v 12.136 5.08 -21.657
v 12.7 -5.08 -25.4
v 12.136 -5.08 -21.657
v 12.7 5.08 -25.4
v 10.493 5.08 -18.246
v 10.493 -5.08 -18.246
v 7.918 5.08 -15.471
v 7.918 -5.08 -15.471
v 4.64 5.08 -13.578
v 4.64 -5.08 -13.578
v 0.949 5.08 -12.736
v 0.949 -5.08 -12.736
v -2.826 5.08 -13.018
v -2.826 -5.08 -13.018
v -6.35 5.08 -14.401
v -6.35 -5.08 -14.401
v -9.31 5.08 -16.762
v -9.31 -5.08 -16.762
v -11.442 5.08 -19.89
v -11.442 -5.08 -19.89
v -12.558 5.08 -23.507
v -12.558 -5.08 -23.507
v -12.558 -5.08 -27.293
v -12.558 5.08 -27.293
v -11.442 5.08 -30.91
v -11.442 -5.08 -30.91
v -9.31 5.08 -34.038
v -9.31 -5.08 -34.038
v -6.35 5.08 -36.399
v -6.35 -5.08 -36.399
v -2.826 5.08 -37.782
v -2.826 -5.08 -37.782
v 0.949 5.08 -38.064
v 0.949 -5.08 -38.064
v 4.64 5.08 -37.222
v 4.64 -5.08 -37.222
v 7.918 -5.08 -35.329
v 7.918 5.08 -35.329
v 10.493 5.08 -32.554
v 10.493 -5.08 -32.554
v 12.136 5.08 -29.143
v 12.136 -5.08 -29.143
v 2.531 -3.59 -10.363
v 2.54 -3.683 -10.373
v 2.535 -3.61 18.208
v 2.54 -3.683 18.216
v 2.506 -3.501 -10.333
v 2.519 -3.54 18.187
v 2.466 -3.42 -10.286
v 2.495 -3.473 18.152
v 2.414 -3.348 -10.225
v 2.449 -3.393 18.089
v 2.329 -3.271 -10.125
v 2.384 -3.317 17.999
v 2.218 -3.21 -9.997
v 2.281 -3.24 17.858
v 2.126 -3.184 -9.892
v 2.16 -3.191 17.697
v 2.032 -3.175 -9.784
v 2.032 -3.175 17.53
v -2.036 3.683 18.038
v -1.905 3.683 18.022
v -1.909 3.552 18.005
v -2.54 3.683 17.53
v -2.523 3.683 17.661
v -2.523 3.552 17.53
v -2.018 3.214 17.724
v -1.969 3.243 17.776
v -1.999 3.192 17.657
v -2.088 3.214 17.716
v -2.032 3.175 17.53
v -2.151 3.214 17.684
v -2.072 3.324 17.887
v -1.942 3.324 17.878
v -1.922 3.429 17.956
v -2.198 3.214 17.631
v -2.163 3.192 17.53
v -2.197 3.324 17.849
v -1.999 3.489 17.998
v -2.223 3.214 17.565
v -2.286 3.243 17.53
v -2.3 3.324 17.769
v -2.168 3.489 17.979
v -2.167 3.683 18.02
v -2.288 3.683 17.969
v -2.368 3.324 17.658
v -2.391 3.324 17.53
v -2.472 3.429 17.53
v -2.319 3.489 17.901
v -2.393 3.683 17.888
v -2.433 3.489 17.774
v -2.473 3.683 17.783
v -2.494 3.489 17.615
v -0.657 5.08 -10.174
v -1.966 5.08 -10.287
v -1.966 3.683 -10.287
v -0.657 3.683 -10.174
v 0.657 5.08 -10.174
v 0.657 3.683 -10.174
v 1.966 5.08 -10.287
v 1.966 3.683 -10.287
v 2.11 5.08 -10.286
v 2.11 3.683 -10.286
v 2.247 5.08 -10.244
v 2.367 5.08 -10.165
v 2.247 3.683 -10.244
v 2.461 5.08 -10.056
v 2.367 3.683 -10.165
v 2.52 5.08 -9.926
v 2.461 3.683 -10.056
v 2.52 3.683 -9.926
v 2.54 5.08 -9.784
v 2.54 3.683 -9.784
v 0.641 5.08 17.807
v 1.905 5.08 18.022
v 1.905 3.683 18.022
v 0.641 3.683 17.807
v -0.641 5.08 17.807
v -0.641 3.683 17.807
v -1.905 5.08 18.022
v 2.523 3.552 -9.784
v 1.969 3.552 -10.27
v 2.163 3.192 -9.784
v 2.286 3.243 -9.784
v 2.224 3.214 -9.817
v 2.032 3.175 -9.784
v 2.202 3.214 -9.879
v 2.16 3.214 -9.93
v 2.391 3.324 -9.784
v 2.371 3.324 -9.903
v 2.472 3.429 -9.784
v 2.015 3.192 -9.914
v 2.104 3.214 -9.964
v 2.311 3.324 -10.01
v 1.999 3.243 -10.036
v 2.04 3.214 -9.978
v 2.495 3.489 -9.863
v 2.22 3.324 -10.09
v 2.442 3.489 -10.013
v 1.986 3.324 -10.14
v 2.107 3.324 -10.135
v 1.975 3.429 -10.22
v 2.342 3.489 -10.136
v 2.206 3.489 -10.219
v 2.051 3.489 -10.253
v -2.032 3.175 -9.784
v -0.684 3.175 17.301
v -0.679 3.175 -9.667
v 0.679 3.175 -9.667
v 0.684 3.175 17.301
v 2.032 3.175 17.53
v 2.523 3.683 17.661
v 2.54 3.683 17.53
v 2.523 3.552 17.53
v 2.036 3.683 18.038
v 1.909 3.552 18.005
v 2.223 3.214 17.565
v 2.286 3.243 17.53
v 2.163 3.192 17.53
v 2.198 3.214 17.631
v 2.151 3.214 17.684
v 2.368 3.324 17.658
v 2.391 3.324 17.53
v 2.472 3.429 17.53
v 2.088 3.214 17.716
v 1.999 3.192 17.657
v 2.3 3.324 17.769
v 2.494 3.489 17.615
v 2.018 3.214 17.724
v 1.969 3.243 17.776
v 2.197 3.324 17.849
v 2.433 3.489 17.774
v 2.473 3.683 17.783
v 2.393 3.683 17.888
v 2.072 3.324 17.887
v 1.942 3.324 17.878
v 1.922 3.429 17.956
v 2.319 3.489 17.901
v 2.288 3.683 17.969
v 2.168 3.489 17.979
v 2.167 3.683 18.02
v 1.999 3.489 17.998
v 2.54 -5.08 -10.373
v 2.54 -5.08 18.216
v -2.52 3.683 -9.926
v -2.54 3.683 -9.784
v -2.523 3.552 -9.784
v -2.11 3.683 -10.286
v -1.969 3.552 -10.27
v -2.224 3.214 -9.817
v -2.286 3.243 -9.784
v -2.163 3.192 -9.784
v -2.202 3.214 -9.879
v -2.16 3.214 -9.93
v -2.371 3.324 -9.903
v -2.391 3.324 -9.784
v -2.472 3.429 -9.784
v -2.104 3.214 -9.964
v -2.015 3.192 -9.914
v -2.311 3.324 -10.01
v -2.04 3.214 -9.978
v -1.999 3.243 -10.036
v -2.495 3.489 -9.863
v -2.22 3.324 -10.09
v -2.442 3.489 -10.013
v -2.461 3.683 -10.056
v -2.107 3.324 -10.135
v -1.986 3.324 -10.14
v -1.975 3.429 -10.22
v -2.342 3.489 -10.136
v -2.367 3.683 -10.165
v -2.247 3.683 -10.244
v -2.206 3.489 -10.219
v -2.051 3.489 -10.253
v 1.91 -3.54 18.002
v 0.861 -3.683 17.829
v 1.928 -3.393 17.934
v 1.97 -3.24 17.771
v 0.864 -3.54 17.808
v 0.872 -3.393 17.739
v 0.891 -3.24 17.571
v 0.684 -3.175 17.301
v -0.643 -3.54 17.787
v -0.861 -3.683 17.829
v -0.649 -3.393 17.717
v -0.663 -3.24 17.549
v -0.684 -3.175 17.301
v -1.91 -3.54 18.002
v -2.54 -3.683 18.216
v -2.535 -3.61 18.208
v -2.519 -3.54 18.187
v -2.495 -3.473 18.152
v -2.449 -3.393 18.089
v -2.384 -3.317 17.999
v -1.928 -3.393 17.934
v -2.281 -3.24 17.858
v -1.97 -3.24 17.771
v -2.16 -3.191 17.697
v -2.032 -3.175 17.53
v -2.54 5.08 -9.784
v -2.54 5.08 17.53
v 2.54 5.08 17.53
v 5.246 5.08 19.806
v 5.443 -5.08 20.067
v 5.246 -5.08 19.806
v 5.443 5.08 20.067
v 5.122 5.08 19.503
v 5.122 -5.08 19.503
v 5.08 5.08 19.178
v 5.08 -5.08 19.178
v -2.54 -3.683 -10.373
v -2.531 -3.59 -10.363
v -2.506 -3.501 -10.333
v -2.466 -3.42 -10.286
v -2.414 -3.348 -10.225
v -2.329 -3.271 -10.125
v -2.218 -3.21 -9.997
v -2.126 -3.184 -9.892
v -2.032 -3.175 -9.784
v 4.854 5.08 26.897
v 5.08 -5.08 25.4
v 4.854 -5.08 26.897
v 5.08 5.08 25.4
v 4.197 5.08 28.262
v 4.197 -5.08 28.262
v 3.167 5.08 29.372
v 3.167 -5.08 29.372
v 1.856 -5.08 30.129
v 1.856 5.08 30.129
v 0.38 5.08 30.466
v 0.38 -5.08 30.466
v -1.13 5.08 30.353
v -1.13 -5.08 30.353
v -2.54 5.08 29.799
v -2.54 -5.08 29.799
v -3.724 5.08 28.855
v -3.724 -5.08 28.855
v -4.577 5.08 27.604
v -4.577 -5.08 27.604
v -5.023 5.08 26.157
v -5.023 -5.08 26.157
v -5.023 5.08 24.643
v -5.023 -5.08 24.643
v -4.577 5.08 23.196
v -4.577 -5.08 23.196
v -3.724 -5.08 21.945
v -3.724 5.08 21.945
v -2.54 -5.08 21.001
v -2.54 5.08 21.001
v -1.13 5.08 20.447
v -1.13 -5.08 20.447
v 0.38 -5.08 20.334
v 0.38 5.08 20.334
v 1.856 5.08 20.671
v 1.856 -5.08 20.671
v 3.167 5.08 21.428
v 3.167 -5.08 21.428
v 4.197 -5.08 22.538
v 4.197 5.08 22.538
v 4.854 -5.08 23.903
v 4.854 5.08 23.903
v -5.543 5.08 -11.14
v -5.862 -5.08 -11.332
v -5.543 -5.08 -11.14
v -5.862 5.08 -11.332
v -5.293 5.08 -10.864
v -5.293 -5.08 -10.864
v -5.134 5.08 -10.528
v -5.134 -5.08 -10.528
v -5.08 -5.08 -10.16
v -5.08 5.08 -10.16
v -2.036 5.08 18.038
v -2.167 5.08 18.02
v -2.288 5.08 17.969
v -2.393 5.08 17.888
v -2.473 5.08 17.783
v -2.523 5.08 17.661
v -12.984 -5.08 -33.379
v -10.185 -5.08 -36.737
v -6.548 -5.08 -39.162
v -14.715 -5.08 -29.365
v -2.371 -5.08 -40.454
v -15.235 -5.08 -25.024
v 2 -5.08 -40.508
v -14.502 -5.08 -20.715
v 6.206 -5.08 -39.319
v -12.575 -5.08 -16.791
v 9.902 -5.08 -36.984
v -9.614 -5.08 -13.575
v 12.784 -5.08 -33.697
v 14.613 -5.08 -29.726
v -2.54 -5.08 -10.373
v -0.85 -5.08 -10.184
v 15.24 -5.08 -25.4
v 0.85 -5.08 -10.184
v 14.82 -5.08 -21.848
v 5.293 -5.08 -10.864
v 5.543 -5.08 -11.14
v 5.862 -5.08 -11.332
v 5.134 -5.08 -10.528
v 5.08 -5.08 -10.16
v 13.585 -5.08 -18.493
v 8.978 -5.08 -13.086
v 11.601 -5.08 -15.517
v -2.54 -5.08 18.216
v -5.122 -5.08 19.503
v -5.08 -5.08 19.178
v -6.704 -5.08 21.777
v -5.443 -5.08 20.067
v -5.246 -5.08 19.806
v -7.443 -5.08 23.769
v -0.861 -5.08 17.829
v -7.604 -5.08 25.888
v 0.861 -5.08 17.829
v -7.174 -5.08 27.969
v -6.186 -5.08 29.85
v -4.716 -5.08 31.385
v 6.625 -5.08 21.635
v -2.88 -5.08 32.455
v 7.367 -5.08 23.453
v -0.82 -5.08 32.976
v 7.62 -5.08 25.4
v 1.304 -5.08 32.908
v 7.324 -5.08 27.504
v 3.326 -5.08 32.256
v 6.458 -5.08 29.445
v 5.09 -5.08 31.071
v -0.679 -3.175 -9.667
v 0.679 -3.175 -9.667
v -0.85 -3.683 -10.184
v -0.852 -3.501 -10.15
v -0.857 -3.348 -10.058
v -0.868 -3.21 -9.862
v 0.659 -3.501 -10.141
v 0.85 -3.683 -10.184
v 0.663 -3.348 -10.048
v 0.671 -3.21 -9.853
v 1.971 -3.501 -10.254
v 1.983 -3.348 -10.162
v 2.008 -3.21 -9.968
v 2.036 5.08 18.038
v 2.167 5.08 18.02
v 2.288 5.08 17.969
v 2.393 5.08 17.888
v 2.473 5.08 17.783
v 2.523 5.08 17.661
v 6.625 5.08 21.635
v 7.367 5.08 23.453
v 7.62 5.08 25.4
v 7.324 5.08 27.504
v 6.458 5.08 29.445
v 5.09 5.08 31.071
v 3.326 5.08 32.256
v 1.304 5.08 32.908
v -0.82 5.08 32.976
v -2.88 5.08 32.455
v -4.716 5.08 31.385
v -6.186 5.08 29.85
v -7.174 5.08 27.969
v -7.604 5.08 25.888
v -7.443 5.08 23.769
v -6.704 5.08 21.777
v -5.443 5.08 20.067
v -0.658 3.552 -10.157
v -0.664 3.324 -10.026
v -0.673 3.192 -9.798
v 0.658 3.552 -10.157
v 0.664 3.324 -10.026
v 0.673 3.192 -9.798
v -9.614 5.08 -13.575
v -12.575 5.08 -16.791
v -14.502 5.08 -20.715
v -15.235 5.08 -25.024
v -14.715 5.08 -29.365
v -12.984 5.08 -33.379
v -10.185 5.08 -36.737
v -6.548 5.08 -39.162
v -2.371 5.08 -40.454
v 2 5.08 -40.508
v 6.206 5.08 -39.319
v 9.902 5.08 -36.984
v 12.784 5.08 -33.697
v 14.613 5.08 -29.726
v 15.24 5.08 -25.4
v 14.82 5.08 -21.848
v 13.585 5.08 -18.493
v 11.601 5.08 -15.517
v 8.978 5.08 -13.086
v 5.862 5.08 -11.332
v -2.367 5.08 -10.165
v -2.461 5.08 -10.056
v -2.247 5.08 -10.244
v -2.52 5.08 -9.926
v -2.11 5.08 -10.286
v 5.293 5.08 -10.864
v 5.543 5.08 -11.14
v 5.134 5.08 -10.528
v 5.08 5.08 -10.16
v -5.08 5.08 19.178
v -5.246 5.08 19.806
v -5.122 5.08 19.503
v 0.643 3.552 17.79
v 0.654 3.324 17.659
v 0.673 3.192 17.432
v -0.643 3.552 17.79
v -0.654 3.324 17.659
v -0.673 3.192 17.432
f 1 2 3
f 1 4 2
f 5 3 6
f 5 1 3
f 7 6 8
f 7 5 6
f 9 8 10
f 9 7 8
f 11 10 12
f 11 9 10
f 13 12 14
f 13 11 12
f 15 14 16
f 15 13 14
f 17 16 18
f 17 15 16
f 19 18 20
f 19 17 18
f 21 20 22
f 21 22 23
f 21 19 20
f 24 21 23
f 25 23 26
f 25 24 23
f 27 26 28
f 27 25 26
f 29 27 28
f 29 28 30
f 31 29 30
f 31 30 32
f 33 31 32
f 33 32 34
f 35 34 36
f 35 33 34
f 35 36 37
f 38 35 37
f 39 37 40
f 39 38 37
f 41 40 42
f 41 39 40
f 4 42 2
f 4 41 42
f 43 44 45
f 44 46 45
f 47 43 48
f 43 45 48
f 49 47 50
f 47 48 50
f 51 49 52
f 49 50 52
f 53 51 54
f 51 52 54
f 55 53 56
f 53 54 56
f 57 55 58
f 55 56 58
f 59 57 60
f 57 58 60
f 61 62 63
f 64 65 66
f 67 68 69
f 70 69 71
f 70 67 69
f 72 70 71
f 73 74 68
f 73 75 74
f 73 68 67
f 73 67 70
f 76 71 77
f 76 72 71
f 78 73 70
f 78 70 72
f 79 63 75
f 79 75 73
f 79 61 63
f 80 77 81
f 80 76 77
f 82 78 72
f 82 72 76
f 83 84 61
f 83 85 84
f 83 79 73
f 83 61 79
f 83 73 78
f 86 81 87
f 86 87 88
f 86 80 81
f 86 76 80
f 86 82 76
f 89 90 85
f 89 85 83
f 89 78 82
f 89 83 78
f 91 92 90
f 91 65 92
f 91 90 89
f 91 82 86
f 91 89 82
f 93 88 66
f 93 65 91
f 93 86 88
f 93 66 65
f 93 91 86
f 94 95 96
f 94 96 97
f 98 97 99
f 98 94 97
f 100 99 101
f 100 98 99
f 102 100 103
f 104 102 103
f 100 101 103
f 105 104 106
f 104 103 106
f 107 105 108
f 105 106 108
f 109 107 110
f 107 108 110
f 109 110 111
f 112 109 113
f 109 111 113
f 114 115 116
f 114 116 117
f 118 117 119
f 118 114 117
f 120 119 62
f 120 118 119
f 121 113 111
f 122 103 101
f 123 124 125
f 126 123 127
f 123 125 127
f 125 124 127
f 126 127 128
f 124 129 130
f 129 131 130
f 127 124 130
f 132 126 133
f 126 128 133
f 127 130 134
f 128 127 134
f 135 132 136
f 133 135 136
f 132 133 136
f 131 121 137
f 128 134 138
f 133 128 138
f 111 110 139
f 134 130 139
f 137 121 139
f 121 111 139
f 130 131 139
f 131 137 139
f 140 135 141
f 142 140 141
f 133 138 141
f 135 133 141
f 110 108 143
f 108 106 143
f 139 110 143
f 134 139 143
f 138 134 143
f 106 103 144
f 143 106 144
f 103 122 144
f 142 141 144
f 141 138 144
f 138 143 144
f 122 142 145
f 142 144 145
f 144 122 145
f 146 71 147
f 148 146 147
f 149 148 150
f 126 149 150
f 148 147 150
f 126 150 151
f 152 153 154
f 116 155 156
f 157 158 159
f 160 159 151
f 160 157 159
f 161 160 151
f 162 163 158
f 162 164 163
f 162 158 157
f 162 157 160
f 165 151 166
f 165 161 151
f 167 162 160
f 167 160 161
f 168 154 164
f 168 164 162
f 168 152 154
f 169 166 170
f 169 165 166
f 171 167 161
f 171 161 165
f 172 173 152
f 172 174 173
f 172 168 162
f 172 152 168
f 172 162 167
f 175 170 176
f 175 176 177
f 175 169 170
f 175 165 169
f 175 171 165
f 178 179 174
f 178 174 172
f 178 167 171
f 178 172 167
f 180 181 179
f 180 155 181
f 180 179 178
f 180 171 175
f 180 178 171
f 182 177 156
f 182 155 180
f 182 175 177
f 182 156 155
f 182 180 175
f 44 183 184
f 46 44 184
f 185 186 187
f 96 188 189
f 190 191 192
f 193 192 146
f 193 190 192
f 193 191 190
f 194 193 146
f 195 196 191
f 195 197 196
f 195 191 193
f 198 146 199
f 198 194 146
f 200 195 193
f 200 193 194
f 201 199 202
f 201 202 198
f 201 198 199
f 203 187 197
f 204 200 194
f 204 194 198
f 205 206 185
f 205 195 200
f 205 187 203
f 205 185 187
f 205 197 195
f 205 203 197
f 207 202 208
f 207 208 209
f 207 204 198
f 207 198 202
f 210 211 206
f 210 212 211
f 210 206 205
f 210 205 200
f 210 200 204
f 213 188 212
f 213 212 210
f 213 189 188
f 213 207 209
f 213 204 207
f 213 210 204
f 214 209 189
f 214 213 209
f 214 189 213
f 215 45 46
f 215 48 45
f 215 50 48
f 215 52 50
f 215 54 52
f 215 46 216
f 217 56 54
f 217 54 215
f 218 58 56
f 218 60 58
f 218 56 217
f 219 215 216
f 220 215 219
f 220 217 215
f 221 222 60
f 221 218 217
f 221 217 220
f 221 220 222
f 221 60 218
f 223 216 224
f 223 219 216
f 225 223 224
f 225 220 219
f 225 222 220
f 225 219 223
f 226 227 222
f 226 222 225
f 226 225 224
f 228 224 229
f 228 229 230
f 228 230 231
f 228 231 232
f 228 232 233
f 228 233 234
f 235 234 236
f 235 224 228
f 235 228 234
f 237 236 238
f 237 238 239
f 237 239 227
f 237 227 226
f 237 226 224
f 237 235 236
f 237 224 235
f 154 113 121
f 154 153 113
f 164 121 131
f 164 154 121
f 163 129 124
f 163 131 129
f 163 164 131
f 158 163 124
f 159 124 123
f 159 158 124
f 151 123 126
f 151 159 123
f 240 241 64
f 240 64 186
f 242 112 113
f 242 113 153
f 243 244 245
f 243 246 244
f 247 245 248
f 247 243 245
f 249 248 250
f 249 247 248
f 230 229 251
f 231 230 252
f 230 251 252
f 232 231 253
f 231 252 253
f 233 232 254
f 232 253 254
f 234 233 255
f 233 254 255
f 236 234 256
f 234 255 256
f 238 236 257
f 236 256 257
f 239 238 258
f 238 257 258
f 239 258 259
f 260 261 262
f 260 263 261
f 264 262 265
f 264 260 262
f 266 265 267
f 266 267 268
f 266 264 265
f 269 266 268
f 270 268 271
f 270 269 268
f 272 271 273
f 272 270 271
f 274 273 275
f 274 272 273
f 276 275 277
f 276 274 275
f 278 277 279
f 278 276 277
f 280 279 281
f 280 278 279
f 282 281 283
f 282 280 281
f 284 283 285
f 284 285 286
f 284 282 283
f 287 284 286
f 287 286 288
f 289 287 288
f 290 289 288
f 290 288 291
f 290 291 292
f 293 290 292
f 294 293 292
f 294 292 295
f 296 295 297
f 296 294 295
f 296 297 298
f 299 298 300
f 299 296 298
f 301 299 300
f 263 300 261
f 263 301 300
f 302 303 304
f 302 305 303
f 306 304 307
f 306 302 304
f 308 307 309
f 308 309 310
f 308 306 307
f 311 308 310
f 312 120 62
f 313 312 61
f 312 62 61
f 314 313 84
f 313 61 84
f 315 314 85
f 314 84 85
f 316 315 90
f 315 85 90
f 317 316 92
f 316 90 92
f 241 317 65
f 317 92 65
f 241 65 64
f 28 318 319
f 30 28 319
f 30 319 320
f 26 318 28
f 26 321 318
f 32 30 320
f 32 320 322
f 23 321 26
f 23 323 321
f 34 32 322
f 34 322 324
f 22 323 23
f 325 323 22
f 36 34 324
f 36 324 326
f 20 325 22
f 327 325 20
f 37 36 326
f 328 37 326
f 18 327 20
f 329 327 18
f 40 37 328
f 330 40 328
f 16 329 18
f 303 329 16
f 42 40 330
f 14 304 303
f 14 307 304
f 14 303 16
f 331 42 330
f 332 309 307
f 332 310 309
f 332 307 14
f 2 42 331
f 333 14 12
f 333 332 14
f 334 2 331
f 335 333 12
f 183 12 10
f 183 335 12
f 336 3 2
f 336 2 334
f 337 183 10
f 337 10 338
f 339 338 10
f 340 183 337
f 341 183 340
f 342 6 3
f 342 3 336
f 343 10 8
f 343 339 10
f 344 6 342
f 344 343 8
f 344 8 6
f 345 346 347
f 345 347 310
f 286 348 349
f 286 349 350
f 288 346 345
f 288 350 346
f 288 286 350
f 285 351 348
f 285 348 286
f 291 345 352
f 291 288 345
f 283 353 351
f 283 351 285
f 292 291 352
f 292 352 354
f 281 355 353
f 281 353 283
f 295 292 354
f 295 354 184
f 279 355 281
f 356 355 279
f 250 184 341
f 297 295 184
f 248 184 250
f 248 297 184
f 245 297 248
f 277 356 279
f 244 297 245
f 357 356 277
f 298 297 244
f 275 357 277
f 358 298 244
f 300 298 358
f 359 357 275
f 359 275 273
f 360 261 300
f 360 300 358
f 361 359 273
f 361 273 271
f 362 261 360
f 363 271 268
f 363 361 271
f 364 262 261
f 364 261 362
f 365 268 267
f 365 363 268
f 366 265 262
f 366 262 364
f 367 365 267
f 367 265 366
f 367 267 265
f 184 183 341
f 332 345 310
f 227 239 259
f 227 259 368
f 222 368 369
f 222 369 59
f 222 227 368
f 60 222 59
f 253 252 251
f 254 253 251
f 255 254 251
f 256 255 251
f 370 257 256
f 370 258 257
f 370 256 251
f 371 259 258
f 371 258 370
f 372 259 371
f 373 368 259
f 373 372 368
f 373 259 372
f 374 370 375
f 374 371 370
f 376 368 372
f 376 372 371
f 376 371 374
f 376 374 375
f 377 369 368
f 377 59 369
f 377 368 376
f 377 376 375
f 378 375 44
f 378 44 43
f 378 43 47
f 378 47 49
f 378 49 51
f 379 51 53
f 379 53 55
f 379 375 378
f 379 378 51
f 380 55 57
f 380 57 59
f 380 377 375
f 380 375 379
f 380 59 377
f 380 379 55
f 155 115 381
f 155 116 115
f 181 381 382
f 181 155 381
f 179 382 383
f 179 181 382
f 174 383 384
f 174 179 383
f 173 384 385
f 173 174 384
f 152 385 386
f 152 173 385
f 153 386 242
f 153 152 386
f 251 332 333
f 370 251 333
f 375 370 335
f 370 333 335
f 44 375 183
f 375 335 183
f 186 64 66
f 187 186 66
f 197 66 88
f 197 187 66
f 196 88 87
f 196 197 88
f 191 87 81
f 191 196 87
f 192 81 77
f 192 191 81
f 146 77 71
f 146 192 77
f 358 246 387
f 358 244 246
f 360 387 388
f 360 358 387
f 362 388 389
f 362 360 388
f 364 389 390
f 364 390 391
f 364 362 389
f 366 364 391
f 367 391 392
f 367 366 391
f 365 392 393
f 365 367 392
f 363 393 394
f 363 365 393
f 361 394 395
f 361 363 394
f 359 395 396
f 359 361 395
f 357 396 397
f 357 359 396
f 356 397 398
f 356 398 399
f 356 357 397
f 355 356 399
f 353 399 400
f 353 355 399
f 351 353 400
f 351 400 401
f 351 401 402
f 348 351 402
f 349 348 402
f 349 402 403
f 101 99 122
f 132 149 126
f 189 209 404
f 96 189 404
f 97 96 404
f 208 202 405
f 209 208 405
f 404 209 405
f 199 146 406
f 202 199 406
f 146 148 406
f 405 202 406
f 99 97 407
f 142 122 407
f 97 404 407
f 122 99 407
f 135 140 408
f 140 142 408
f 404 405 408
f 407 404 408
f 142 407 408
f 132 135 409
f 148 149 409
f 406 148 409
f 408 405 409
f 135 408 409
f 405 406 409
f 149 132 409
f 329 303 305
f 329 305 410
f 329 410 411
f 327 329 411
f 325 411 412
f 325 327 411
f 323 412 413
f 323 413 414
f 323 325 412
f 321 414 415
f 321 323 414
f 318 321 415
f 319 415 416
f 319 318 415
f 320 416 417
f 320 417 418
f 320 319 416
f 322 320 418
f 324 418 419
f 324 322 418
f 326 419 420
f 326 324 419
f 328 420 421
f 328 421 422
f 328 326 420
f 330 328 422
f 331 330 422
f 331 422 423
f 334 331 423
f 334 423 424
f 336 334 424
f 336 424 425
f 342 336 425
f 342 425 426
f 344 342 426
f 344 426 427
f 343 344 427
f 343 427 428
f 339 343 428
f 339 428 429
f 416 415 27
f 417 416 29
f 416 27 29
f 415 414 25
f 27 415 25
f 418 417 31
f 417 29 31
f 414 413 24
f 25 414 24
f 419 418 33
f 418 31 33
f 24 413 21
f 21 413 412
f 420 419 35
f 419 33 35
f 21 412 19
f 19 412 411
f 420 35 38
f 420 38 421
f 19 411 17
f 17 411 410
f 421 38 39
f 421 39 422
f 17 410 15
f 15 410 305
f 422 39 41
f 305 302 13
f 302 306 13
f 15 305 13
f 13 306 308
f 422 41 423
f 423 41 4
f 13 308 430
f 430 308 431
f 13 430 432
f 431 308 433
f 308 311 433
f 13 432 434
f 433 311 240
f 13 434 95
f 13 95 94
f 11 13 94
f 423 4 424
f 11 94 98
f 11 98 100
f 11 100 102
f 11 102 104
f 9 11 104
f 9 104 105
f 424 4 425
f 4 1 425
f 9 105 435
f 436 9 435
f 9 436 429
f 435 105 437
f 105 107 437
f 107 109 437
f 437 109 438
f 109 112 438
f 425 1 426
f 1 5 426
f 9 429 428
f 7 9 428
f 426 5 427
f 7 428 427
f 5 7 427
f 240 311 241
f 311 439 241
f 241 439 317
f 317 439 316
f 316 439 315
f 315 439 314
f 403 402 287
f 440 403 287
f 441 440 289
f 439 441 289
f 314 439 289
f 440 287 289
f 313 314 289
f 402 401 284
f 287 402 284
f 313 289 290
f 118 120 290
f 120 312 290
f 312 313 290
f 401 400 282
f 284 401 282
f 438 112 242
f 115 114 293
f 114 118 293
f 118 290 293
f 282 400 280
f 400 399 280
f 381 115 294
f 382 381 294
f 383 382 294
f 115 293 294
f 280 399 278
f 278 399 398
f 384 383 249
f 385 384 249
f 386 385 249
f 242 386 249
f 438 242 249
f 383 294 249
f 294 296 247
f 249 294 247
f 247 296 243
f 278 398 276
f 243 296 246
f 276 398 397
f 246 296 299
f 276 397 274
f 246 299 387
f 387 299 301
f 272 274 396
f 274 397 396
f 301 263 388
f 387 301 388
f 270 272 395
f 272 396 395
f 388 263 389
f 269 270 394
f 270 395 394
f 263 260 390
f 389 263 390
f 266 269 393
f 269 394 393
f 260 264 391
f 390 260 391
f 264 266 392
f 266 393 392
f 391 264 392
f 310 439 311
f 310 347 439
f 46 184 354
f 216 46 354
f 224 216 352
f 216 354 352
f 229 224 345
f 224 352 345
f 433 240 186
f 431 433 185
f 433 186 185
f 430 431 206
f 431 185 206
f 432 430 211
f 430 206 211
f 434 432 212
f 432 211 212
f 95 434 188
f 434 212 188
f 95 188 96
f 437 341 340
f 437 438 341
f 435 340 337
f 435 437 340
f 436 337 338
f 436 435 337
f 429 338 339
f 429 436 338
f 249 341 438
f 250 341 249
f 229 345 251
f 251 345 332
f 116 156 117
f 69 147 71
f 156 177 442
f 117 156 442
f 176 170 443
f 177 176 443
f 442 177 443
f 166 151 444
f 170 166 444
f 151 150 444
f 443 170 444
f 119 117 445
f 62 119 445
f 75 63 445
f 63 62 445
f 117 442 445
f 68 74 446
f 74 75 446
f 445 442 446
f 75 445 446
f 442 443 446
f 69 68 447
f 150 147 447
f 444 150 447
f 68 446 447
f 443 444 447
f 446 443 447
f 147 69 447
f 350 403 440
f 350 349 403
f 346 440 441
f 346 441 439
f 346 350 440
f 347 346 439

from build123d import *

# Parameters (mm, degrees)
F0_R     = 5.08
F0_R_2   = 12.7
F1_DEPTH = 5.08
F2_R     = 1.27
F4_DEPTH = 1.905
F5_R     = 0.508


# Not quite as in the source:
# - a pattern or mirror of a feature is missing from the dataset's text; its kind, count and spacing are read off the source's solid


with BuildPart() as f1:
    # F0 (on Front) → F1 (new body, symmetric)
    with BuildSketch(Plane.XZ):
        with BuildLine():
            ThreePointArc((5.08, 19.7203873372), (6.9560764803, 22.2891480267), (7.62, 25.4))
            ThreePointArc((7.62, 25.4), (-3.1108519733, 32.3560764803), (-5.08, 19.7203873372))
            ThreePointArc((-5.08, 19.7203873372), (0, 17.78), (5.08, 19.7203873372))
        make_face()
        with Locations((0, 25.4)):
            Circle(F0_R, mode=Mode.SUBTRACT)
        with BuildLine():
            ThreePointArc((5.08, 19.7203873372), (0, 17.78), (-5.08, 19.7203873372))
            Line((-5.08, 19.7203873372), (-5.08, -11.0315902063))
            ThreePointArc((-5.08, -11.0315902063), (0, -10.16), (5.08, -11.0315902063))
            Line((5.08, -11.0315902063), (5.08, 19.7203873372))
        make_face()
        with BuildLine():
            ThreePointArc((5.08, -11.0315902063), (0, -10.16), (-5.08, -11.0315902063))
            ThreePointArc((-5.08, -11.0315902063), (-8.7988181024, -37.8434078933), (15.24, -25.4))
            ThreePointArc((15.24, -25.4), (12.4434078933, -16.6011818976), (5.08, -11.0315902063))
        make_face()
        with Locations((0, -25.4)):
            Circle(F0_R_2, mode=Mode.SUBTRACT)
    extrude(amount=F1_DEPTH, both=True)

    # F2
    f2_edges = [f1.edges().sort_by_distance(p)[0] for p in [
        (-5.08, 0, 19.720387),
        (-5.08, 0, -11.03159),
        (5.08, 0, 19.720387),
        (5.08, 0, -11.03159),
    ]]
    fillet(f2_edges, radius=F2_R)

    # F3 (on face) → F4 (cut)
    with BuildSketch(Plane.XZ.offset(5.08)):
        with BuildLine():
            ThreePointArc((2.54, 18.2157951031), (0, 17.78), (-2.54, 18.2157951031))
            Line((-2.54, 18.2157951031), (-2.54, -10.3731573509))
            ThreePointArc((-2.54, -10.3731573509), (0, -10.16), (2.54, -10.3731573509))
            Line((2.54, -10.3731573509), (2.54, 18.2157951031))
        make_face()
    f4 = extrude(amount=-F4_DEPTH, mode=Mode.SUBTRACT)

    # F4_copies: F4 across plane
    add(f4.mirror(Plane.ZX), mode=Mode.SUBTRACT)

    # F5
    f5_edges = [f1.edges().sort_by_distance(p)[0] for p in [
        (-2.54, -3.175, 3.921319),
        (0, -3.175, 17.78),
        (2.54, -3.175, 3.921319),
        (0, -3.175, -10.16),
        (2.54, 4.1275, -10.373157),
        (2.54, 4.1275, 18.215795),
        (2.54, 3.175, 3.921319),
        (-2.54, 4.1275, 18.215795),
        (0, 3.175, 17.78),
        (-2.54, 4.1275, -10.373157),
        (-2.54, 3.175, 3.921319),
        (0, 3.175, -10.16),
    ]]
    fillet(f5_edges, radius=F5_R)


solid = f1.part
